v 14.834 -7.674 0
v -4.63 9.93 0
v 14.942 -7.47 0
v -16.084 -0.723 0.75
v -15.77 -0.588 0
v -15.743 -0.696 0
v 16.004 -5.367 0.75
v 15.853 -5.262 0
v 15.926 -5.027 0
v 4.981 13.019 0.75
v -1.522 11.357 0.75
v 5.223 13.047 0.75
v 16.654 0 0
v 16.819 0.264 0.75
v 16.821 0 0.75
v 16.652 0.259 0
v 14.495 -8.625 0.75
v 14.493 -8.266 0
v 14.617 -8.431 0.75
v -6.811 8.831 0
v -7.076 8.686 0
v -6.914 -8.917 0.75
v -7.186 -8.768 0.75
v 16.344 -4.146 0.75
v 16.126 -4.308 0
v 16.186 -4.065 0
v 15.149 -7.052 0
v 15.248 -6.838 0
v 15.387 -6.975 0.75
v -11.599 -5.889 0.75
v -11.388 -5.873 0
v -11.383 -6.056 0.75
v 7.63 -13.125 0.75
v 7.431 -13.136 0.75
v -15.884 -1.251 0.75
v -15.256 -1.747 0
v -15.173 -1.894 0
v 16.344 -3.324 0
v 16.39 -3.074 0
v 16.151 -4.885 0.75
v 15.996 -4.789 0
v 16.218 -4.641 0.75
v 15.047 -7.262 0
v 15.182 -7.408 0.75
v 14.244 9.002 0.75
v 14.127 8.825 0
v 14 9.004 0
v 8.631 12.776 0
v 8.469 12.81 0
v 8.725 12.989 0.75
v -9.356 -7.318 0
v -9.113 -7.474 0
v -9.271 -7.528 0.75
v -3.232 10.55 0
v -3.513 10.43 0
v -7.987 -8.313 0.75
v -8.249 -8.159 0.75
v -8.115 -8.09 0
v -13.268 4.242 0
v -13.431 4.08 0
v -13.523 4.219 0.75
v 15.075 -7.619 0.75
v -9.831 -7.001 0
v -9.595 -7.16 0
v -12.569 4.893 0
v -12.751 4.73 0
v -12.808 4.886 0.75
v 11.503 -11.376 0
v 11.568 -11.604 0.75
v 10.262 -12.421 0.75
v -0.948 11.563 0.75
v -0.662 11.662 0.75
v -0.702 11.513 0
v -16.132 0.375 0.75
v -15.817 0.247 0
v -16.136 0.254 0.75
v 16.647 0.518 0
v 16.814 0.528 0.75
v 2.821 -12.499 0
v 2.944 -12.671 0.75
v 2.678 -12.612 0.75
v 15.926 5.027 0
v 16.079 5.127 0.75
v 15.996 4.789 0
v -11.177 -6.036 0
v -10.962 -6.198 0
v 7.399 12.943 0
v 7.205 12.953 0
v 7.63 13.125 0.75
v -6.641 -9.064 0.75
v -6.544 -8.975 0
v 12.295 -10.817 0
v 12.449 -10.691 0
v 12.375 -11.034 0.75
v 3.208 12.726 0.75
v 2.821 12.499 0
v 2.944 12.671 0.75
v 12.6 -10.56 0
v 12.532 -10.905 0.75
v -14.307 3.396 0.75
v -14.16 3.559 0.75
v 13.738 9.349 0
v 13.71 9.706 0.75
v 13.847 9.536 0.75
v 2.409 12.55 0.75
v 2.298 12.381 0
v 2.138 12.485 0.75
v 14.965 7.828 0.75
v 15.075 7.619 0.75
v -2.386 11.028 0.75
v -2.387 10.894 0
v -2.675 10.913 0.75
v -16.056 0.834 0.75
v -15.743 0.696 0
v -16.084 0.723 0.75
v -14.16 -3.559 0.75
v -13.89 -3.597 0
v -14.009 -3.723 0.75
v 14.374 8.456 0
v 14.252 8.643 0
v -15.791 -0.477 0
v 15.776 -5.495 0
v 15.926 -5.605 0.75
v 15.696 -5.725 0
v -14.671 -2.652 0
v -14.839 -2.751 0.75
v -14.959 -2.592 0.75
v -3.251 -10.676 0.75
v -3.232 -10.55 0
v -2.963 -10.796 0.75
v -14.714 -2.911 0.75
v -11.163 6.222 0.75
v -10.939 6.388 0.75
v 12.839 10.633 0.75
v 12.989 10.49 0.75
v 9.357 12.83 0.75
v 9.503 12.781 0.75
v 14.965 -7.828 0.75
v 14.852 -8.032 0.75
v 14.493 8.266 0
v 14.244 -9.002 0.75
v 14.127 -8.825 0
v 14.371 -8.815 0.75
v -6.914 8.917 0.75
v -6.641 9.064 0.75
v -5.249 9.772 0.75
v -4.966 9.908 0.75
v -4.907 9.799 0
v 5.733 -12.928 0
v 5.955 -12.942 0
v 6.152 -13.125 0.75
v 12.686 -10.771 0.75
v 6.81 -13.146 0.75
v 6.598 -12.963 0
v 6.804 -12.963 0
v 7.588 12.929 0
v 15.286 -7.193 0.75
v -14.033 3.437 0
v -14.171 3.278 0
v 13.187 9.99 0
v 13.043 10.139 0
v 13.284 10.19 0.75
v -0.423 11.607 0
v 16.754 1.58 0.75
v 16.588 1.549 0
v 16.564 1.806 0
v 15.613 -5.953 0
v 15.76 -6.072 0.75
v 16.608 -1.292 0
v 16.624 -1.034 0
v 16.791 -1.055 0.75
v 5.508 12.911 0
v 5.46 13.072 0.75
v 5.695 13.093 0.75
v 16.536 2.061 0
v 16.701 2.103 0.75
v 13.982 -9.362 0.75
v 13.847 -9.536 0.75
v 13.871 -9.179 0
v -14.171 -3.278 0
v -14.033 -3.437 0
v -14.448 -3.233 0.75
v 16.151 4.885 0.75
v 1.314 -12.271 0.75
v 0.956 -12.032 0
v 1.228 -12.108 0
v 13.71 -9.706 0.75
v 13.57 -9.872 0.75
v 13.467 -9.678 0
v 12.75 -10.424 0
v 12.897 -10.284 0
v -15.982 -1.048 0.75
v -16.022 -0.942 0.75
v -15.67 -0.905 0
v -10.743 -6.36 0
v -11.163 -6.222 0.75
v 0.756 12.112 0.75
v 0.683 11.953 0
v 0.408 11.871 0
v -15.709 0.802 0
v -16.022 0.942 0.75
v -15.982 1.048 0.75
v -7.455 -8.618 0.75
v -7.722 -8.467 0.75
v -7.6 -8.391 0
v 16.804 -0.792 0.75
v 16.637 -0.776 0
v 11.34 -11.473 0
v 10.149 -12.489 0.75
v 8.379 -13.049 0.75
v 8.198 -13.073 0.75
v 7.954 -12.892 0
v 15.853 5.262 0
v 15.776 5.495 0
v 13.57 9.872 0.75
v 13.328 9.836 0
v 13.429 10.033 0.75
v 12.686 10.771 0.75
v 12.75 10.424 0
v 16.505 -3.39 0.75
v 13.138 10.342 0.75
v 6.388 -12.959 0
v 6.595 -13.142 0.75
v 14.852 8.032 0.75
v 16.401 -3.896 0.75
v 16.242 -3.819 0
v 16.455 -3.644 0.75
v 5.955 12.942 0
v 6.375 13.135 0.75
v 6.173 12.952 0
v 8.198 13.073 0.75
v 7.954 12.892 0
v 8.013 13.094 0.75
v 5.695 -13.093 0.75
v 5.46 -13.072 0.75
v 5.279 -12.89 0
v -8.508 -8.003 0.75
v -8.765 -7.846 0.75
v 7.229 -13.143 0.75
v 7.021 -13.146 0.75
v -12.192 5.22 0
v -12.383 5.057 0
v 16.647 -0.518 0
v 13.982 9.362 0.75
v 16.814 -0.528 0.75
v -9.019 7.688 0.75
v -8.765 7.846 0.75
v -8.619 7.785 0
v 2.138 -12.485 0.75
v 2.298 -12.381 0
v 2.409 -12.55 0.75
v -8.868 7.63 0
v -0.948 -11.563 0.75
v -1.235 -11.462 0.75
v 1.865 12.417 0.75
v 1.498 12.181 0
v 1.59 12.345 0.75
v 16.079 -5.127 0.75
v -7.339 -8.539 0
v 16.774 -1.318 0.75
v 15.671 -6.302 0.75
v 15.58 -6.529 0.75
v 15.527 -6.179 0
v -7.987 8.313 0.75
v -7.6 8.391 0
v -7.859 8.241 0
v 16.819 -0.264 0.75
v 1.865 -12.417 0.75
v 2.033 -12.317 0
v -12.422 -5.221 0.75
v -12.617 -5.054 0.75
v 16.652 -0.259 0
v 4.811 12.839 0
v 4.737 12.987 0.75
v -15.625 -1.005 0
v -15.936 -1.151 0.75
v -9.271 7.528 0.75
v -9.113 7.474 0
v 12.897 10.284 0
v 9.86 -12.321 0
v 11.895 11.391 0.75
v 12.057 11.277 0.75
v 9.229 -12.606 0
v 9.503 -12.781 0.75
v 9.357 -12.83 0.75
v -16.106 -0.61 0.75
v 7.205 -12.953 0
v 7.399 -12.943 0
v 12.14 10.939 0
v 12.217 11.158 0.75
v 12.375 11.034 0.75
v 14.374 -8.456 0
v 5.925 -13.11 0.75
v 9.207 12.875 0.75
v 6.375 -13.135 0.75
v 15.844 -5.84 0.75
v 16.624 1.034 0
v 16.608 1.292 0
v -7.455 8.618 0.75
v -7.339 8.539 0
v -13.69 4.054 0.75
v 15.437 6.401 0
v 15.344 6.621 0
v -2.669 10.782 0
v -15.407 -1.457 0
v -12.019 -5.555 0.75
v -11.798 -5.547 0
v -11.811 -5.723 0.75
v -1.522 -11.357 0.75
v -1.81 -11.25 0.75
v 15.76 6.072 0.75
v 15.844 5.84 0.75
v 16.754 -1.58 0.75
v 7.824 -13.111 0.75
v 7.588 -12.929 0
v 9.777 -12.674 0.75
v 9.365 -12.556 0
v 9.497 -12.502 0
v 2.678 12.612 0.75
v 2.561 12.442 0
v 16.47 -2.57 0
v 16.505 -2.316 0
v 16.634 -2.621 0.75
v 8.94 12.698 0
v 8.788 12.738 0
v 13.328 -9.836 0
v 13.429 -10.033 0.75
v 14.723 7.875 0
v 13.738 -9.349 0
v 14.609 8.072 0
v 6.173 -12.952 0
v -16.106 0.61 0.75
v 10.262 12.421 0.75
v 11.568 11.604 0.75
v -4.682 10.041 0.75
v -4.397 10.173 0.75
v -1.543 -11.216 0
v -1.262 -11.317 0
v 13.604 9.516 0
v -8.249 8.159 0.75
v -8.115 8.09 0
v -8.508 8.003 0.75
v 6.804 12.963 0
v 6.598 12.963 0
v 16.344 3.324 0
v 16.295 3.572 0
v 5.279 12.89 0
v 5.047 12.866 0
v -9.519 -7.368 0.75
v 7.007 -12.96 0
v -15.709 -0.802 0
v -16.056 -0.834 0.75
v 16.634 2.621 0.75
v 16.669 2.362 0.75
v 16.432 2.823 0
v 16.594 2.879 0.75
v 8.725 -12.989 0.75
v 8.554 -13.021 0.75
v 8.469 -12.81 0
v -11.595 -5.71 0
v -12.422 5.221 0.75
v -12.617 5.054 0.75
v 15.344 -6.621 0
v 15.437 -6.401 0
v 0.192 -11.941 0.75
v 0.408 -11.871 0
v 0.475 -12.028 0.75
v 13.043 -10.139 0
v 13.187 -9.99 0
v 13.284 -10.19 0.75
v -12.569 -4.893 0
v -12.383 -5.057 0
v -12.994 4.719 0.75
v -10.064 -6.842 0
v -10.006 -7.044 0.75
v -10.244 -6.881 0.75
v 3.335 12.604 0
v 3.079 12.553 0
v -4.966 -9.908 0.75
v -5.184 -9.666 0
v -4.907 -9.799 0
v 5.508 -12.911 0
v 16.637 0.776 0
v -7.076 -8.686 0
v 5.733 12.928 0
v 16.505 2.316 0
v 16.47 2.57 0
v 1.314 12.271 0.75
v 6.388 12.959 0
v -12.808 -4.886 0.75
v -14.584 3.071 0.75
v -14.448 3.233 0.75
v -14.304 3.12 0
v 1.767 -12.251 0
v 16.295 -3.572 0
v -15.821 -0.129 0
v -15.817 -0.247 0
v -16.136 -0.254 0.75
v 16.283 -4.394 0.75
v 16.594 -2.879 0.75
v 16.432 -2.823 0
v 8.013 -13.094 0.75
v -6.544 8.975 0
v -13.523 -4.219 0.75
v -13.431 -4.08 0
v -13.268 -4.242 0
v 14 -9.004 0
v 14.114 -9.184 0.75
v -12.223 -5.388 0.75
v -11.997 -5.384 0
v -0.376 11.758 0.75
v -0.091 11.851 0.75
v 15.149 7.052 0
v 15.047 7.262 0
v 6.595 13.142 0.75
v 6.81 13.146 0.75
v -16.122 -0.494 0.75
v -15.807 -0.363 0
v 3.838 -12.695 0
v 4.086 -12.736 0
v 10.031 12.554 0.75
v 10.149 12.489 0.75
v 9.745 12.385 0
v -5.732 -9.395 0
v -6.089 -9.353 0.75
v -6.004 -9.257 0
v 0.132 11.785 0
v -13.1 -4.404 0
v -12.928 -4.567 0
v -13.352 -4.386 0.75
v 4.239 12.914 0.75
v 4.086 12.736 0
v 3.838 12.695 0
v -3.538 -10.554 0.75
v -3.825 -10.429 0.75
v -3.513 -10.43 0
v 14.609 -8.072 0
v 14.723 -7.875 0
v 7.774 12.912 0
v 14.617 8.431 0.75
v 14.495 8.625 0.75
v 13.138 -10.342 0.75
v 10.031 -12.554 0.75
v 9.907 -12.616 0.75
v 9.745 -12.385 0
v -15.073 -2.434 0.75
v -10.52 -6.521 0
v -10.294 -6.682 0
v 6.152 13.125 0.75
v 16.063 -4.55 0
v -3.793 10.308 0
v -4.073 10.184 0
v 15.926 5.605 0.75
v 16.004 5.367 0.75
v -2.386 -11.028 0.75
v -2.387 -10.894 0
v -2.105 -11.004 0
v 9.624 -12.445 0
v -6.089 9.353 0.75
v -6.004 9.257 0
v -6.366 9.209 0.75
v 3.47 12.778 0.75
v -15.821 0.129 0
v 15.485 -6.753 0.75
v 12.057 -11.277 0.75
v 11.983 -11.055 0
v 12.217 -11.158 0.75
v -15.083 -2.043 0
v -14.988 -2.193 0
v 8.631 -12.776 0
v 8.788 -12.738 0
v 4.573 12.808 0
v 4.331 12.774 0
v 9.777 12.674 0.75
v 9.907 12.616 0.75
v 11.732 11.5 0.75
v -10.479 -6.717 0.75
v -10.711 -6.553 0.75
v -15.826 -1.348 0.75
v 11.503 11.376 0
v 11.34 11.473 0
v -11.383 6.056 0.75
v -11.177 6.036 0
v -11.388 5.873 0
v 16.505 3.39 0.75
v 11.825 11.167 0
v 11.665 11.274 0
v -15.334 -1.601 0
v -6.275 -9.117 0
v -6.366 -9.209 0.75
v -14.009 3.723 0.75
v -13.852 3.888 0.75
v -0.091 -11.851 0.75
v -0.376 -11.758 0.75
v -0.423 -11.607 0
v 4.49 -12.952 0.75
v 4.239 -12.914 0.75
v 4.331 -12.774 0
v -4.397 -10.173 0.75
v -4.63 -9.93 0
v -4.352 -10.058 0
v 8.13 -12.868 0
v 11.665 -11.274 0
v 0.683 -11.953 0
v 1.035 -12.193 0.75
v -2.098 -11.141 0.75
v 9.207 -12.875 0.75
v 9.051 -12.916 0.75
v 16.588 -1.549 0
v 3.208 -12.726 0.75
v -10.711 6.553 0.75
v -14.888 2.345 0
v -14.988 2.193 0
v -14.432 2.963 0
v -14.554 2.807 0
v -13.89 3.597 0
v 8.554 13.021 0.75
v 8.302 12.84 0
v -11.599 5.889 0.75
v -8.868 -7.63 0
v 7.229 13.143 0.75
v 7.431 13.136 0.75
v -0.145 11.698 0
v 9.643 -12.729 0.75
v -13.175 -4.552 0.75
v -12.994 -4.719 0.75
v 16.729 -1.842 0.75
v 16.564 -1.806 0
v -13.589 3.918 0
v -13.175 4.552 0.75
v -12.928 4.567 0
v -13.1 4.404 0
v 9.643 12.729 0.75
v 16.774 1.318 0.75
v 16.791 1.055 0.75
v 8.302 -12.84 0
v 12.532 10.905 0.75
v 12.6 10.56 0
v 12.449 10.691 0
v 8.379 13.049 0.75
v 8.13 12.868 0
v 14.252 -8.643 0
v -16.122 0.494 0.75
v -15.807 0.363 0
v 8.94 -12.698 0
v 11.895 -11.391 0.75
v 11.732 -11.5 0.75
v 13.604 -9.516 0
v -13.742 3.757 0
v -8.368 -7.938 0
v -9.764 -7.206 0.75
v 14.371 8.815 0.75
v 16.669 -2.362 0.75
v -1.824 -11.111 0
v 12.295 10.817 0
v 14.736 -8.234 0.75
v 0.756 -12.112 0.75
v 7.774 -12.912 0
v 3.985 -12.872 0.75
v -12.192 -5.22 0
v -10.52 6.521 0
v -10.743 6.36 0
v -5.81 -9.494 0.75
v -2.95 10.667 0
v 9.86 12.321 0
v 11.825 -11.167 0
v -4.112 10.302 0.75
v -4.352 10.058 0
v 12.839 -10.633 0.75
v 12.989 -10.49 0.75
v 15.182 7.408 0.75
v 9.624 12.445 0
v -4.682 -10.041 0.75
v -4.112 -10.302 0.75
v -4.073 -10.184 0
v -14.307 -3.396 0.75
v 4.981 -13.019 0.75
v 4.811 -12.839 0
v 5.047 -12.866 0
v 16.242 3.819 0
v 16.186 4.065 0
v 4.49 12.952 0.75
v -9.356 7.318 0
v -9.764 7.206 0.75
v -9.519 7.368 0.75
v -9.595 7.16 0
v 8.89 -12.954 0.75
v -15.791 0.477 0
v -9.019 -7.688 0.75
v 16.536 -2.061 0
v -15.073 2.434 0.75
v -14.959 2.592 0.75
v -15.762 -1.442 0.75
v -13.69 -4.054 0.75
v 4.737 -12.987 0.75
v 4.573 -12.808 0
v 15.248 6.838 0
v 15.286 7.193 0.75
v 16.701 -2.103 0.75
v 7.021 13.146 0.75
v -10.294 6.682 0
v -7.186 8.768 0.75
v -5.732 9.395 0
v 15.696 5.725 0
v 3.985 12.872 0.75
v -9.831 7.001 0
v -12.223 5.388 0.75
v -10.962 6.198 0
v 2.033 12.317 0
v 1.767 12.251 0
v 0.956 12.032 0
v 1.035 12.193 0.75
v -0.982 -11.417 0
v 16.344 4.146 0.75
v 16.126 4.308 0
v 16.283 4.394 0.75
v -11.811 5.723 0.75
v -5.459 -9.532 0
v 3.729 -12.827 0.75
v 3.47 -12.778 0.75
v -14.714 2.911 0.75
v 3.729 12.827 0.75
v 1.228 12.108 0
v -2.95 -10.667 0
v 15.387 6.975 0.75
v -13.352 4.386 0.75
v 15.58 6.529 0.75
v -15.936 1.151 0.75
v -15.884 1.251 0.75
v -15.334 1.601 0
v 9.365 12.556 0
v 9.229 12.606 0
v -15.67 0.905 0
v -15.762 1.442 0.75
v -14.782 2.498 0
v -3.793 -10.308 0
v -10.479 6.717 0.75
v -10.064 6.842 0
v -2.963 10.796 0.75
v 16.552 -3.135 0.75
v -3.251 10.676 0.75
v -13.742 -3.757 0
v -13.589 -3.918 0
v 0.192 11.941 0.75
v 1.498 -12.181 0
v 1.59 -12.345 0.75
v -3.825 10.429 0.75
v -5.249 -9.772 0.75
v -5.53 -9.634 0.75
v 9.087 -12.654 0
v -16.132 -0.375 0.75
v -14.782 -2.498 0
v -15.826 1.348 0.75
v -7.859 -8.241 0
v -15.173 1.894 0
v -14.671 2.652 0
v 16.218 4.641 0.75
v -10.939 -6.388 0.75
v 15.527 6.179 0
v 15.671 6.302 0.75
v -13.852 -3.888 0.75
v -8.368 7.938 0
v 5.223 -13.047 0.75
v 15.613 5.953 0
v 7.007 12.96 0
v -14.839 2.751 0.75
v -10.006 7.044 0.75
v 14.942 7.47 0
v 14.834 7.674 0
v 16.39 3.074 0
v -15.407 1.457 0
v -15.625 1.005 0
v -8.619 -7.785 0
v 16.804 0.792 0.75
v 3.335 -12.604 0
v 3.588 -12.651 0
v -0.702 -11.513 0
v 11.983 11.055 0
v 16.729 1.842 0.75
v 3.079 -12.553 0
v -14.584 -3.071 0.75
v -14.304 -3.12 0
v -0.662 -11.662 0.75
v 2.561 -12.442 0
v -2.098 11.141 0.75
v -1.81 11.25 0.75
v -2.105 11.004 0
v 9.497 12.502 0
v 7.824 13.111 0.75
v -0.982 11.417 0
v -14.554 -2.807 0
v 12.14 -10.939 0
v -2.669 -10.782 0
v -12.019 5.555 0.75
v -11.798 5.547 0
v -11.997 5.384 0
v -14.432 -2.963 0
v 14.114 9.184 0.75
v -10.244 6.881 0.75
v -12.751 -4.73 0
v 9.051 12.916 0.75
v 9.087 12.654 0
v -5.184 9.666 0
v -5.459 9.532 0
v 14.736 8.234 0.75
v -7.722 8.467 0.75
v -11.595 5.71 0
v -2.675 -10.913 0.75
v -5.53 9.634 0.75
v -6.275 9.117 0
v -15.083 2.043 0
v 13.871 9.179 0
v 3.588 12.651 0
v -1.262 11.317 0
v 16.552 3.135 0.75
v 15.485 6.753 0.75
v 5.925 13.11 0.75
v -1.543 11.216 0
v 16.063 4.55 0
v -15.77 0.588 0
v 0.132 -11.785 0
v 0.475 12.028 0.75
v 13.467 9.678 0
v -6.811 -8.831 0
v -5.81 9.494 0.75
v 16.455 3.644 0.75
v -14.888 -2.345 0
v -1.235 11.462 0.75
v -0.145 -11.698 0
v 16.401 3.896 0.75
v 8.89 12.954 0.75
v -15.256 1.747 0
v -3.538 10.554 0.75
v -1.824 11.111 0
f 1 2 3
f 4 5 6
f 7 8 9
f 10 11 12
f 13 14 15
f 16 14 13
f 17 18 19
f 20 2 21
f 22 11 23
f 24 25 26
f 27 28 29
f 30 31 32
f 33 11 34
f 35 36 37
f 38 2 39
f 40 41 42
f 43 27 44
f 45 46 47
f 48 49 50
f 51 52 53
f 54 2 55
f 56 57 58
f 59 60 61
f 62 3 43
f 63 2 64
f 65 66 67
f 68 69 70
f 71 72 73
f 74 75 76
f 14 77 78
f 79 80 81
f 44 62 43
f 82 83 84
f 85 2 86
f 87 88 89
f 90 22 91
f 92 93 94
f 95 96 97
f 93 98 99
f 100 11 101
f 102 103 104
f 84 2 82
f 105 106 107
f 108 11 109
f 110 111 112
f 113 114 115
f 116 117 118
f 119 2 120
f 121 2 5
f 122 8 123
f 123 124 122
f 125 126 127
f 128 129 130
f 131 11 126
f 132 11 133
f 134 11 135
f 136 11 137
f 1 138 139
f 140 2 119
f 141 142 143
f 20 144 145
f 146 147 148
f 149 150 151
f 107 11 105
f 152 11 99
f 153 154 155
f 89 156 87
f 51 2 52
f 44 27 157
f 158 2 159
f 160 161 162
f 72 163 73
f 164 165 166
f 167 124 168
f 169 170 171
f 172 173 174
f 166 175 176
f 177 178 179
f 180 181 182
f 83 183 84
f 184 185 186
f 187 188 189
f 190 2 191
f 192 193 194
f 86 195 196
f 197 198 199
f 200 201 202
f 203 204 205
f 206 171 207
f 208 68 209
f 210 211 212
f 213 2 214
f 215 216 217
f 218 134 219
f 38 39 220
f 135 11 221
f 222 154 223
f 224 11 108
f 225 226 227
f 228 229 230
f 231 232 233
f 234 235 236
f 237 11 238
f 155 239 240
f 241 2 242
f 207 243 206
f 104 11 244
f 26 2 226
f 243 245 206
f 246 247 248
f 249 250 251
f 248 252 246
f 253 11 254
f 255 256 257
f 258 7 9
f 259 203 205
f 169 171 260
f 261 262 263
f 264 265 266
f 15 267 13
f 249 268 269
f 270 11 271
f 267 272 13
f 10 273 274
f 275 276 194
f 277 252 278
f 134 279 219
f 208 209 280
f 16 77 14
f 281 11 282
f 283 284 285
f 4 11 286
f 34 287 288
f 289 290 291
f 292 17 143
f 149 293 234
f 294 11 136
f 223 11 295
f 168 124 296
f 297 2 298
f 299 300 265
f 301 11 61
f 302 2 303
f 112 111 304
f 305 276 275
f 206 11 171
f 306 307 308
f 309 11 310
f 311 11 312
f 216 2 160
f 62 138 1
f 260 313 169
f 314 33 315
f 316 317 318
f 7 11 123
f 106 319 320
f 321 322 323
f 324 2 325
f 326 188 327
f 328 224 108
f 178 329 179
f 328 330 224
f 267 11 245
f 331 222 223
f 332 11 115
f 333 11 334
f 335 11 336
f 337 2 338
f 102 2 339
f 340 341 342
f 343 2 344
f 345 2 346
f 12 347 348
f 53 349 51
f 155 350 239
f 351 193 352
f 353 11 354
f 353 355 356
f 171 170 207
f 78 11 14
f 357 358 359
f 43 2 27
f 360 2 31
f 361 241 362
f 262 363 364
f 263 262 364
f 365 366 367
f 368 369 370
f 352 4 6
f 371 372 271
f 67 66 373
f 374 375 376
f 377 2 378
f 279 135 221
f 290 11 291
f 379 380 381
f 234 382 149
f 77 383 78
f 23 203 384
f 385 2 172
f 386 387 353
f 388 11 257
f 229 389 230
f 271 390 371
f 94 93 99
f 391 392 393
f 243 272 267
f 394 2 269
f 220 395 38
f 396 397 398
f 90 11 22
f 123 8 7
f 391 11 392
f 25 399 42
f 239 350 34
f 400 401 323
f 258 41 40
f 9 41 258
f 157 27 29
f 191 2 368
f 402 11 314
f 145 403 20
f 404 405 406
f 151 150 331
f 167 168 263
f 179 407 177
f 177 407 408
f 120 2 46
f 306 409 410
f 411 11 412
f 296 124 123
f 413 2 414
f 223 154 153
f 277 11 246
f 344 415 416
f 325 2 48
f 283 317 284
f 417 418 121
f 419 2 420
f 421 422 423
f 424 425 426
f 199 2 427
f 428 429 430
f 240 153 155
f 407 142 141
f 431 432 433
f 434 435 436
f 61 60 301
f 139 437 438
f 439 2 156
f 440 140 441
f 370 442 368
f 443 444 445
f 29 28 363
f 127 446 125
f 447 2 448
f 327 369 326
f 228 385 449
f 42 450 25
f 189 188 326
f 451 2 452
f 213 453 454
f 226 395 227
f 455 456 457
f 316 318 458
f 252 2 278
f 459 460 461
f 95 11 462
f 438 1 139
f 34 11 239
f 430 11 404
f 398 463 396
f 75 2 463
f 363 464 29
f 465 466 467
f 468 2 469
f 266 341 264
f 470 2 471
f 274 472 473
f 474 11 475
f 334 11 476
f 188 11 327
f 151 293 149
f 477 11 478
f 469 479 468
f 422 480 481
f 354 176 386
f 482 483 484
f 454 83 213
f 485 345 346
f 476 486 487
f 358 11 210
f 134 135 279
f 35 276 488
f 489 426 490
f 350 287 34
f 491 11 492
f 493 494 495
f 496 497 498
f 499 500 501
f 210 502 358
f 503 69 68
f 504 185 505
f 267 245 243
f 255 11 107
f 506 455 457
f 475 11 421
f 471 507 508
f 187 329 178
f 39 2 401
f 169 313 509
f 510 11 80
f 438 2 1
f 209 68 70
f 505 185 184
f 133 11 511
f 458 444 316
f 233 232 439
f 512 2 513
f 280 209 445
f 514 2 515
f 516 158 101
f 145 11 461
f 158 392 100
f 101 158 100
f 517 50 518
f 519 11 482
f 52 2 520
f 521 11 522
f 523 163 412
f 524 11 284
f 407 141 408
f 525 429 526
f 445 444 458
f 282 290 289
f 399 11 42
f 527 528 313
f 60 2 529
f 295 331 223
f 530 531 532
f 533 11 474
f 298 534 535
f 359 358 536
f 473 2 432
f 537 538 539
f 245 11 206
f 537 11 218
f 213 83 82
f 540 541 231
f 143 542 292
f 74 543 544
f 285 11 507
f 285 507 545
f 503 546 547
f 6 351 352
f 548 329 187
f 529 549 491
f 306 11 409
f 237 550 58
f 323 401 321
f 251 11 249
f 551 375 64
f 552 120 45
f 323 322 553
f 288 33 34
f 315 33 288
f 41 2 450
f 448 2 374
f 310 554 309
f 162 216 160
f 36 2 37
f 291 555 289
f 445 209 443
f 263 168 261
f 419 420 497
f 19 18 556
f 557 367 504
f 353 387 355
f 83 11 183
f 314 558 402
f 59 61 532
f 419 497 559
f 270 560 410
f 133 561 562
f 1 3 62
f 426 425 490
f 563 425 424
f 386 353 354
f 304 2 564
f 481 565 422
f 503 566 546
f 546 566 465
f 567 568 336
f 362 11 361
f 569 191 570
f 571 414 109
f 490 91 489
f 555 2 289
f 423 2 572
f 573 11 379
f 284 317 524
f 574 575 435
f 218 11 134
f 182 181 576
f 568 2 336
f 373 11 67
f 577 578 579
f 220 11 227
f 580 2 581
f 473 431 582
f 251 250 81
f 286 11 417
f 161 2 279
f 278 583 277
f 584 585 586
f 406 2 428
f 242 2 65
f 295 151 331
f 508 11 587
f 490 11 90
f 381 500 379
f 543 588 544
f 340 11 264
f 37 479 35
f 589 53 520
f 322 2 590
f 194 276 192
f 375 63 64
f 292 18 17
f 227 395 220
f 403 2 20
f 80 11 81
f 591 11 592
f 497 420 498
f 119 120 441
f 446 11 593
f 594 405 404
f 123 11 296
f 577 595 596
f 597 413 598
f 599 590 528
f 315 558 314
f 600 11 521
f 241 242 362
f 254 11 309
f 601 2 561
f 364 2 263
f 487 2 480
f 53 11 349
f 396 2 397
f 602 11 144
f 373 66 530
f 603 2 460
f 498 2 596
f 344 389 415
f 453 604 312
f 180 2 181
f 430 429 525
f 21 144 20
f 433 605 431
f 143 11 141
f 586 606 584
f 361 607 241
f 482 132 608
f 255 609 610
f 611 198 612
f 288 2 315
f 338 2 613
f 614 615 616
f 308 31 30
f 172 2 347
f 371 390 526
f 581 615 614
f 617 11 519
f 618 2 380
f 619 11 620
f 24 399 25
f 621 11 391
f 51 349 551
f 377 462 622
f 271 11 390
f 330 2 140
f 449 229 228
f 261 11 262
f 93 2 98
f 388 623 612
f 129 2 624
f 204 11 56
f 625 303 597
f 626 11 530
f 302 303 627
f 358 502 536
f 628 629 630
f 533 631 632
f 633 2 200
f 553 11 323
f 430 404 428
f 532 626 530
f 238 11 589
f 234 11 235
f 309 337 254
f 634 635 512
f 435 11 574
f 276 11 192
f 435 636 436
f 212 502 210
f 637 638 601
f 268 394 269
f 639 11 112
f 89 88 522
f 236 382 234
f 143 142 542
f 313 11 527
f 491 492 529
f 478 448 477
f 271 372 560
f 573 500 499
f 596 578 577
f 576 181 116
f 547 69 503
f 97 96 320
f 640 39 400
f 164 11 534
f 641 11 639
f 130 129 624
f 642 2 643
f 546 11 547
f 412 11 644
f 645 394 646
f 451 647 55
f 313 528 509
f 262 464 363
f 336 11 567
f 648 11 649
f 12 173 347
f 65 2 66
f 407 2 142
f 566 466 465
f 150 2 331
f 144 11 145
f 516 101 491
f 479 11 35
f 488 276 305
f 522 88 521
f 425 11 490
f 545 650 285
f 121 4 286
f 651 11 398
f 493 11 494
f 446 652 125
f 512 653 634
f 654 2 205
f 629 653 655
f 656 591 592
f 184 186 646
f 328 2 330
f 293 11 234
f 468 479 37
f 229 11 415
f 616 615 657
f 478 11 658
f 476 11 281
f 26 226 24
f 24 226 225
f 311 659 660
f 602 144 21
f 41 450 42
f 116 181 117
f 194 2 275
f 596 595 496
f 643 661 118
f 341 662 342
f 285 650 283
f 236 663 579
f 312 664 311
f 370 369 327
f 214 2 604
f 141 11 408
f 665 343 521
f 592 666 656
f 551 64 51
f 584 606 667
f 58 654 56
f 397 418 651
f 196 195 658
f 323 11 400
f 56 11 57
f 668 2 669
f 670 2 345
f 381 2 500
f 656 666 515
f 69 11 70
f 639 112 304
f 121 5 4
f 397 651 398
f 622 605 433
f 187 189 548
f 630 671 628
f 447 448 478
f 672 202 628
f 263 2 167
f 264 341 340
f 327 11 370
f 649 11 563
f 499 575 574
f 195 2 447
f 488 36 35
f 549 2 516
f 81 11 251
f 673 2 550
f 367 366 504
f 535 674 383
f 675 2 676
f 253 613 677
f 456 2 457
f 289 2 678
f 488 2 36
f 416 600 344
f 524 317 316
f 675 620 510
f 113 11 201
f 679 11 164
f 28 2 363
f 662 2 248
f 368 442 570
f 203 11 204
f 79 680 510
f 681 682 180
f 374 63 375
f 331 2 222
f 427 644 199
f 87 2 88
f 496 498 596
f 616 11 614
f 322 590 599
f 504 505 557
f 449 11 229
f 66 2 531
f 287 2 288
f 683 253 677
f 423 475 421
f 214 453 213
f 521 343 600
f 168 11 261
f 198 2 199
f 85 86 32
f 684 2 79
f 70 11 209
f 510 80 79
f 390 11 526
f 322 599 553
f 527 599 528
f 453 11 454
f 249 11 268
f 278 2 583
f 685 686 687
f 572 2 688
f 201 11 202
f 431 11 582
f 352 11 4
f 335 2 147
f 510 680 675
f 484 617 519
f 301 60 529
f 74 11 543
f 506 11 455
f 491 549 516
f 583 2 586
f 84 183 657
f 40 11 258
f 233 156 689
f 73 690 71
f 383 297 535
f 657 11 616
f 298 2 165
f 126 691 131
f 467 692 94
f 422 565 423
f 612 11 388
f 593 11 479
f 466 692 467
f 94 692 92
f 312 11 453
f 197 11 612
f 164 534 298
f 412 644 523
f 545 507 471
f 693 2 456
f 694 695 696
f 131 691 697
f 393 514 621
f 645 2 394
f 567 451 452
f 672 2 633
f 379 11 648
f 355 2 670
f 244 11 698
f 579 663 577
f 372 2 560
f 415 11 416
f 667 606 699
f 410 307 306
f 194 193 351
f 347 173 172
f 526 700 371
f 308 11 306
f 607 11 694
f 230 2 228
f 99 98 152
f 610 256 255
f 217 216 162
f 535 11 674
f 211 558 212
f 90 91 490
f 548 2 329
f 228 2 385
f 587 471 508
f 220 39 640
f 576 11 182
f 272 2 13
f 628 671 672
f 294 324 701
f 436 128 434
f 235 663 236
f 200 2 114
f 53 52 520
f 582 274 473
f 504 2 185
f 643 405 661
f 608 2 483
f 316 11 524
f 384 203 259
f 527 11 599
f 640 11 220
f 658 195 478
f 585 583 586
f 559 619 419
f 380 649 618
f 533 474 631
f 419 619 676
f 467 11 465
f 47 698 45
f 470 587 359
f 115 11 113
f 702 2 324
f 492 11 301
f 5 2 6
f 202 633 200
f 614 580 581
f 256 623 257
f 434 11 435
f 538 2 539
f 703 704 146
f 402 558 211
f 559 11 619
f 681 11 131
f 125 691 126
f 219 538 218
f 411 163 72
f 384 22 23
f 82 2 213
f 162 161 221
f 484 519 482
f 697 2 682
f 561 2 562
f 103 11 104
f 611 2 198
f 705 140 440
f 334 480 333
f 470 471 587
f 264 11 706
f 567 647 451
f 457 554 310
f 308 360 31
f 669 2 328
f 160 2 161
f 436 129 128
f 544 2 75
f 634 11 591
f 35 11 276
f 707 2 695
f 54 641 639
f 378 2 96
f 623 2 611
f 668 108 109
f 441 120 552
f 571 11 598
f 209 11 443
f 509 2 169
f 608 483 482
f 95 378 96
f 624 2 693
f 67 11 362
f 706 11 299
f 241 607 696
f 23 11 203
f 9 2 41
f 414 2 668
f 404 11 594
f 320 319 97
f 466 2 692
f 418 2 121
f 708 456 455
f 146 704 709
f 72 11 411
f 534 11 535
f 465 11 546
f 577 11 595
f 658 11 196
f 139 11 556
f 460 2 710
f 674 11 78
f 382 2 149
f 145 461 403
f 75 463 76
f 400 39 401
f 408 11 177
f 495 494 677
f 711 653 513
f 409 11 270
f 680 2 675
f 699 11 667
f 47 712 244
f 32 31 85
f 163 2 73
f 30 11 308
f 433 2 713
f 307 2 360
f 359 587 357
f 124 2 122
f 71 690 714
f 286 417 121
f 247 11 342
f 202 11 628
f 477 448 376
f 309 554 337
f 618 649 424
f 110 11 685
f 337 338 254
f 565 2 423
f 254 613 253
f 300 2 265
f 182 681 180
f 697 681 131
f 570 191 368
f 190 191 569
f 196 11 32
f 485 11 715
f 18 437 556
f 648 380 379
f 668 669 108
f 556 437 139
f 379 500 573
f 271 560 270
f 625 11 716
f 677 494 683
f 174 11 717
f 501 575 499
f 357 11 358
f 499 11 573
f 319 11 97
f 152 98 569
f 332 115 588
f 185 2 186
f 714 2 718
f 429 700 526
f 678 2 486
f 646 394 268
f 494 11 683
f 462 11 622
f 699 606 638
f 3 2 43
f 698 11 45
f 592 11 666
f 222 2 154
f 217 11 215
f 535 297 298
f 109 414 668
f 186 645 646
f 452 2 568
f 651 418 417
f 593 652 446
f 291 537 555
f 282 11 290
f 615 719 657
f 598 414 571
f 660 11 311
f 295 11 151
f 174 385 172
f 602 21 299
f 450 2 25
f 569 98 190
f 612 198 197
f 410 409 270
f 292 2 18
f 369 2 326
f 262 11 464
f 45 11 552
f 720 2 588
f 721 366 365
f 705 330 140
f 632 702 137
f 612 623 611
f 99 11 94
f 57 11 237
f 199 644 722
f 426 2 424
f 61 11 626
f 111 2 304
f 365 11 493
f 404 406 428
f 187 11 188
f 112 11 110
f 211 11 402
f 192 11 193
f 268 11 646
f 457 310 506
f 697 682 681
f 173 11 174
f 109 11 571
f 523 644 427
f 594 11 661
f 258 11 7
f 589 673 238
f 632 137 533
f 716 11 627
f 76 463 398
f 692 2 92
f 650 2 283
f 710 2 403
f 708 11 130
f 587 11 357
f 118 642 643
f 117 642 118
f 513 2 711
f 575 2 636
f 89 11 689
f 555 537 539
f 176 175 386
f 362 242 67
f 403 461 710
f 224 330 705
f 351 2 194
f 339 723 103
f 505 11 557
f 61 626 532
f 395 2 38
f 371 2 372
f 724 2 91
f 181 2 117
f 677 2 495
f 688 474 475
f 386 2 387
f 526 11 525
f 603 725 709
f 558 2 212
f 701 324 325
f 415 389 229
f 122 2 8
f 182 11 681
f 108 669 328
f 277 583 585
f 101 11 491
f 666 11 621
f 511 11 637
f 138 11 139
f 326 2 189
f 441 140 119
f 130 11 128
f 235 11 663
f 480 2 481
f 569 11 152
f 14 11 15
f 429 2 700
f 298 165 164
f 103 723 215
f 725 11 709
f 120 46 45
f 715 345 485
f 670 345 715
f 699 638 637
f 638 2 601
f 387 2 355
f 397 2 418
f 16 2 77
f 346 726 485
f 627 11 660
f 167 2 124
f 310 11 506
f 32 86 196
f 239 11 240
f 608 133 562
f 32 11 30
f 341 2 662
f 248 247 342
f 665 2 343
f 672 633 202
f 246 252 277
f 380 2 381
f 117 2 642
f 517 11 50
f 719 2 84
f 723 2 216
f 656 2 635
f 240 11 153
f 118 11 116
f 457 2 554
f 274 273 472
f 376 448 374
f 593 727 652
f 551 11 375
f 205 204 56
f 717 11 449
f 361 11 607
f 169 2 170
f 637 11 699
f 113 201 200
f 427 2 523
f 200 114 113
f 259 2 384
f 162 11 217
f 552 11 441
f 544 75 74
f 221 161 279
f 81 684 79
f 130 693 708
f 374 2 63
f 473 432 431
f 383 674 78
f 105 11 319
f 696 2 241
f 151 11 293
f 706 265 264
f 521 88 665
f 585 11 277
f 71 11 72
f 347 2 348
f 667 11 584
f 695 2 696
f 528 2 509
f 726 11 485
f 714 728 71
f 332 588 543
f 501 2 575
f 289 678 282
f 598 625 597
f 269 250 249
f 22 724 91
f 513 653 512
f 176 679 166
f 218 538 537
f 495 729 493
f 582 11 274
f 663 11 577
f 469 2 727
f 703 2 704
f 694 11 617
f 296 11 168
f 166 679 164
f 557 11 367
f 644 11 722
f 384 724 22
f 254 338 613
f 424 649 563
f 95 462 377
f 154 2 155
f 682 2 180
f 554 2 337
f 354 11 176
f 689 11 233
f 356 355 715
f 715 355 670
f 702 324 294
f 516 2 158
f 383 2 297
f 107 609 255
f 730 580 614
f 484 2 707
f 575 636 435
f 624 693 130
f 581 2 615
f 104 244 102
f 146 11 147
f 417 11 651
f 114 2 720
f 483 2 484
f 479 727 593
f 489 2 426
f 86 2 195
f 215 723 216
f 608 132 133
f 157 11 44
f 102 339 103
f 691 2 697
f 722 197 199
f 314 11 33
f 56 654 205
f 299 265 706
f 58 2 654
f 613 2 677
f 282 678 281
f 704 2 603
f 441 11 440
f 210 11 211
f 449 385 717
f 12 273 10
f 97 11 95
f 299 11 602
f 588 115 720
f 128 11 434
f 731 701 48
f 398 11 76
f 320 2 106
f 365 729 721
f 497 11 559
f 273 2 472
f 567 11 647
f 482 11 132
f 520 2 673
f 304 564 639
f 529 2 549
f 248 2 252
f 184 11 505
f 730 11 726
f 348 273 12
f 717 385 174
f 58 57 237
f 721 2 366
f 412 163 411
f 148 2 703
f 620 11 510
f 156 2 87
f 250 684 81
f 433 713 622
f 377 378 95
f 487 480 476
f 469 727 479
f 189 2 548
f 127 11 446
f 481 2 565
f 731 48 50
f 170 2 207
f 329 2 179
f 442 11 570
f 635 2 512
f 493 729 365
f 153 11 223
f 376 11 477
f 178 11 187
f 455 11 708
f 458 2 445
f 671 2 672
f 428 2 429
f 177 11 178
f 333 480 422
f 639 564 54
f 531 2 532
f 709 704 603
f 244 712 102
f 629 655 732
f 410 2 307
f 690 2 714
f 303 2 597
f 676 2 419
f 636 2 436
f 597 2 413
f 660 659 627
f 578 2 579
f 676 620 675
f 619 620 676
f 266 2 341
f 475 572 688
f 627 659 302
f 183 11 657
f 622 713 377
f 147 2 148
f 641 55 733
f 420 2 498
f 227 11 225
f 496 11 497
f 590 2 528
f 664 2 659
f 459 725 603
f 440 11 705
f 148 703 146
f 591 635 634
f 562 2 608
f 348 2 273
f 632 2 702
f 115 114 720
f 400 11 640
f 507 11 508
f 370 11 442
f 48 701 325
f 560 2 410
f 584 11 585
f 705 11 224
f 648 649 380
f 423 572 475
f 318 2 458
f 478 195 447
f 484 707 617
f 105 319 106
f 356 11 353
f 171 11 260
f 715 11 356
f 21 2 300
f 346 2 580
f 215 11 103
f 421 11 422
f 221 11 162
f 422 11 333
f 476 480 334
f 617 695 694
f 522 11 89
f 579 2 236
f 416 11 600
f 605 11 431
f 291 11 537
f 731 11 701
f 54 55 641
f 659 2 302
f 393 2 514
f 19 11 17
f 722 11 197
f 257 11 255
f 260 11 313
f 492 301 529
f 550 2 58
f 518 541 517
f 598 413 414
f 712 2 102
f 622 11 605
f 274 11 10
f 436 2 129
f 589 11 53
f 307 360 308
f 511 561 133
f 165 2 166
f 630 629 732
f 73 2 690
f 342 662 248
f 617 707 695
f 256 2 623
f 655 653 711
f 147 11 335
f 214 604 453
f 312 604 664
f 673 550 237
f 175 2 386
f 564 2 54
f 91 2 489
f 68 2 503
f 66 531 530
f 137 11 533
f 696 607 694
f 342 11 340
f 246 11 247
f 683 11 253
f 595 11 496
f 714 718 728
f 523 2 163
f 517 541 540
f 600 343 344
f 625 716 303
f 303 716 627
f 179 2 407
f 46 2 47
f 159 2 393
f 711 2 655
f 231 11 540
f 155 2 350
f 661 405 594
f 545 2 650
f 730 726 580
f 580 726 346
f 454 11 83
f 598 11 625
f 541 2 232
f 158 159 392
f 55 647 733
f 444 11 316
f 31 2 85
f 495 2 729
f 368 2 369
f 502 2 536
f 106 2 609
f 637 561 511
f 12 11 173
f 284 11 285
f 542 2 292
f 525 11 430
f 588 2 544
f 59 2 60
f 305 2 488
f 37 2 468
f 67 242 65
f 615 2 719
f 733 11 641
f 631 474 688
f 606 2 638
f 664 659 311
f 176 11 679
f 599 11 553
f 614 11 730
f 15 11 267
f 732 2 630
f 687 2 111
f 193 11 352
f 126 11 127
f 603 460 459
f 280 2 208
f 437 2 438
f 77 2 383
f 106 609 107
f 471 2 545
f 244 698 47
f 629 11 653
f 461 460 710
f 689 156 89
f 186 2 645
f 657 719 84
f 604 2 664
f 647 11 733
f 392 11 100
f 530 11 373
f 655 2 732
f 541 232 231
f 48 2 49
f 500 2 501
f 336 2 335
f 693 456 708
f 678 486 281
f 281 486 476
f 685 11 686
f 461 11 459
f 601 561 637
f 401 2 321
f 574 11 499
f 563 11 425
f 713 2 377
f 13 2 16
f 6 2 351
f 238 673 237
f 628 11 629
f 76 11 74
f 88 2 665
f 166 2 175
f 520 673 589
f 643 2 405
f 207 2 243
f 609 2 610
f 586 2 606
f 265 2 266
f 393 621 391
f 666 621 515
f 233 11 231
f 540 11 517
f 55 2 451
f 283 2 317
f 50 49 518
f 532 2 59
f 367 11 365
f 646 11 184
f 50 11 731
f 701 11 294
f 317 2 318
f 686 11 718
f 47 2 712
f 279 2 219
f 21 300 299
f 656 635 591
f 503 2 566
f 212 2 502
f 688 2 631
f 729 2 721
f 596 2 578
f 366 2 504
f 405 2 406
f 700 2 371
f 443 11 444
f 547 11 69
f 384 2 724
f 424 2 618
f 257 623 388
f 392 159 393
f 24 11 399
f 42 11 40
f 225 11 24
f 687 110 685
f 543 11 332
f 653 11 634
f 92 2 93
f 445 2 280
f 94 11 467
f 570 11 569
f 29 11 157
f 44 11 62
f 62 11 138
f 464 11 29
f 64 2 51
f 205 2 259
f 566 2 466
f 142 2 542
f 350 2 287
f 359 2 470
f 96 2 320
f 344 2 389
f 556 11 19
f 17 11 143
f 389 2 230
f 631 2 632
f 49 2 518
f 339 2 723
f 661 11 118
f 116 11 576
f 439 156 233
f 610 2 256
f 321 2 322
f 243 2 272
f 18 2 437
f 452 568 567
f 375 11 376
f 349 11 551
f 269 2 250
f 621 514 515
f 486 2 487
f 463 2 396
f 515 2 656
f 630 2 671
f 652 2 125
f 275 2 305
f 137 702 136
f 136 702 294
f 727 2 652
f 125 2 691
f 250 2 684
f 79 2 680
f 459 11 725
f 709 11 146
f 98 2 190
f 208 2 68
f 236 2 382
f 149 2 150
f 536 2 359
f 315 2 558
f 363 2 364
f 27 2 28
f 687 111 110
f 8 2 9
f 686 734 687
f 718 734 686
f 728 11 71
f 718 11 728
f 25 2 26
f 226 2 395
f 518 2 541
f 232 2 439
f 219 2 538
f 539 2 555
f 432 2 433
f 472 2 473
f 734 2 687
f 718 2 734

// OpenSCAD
// file: tearConstants.scad
//=================================================================================
// tearConstants.scad
//
// Tear Drop style guitar pick constants, included in all files.
//
// Dr Tom Flint, 20 Feb 2025
//=================================================================================


// choose which pick thickness to make
Num = 7;    // [0,1,2,3,4,5,6,7]

//     0    1    2    3    4    5    6    7
Tn = [0.4, 0.5, 0.6, 0.7, 0.8, 1.0, 1.2, 1.5];
Ln = ["4", "5", "6", "7", "8", "A", "C", "F"];

T = Tn[Num];    // thickness
Label=Ln[Num];  // label

R = 8;      // radius of scaled circles
X = 5.2;    // long dimension of pick
Z = 0.2;    // depth of grip pattern

F = 299;     // set $fn

//=================================================================================
// main file
//=================================================================================
// tearHalf.scad
//
// Dr Tom Flint, 20 Feb 2025
//=================================================================================

include <./tearConstants.scad>

//-----------------------------------------------------------------------------------
// pattern for the upper grip
module tearUpper(){
  
  render()
  intersection(){
    translate([0,0,-0.3])
    scale([1,1,0.02])
    surface(file="./tearUpper.png", center = true);
    translate([0,0,0.5])
    cube([800,800,1],center=true);
  }
}  

//-----------------------------------------------------------------------------------
// pattern for the lower grip
module tearLower(){
  
  render()
  intersection(){
    translate([0,0,-0.3])
    scale([1,1,0.02])
    surface(file="./tearLower.png", center = true);
    translate([0,0,0.5])
    cube([800,800,1],center=true);
  }
}  

//-----------------------------------------------------------------------------------
// half of the pick, side 0 is upper, side 1 is lower
module tearhalf(side=0){
  
  scale([1.1,1.1,1]){

    hull(){
      translate([1.45*X,0,0])
      scale([0.95,1.4,1])
      cylinder(r1=R,r2=1.02*R,h=T/2,$fn=F);
      
      rotate([0,0,115])
      translate([X,0,0])
      scale([0.7,1.95,1])
      cylinder(r1=0.85*R,r2=0.87*R,h=T/2,$fn=F);
      
      rotate([0,0,-115])
      translate([X,0,0])
      scale([0.7,1.95,1])
      cylinder(r1=0.85*R,r2=0.87*R,h=T/2,$fn=F);
    }
    
    if(side==0){
      translate([1,0.5,0])
      rotate([180,0,0])
      scale([0.037,0.037,Z])
      tearUpper();
    }else{
      translate([1,0.5,0])
      rotate([180,0,0])
      scale([0.037,0.037,Z])
      tearLower();
      
      translate([2.5,0,0])
      rotate([0,0,90])
      rotate([180,0,0])
      linear_extrude(height=Z)
      text(Label, font = "Open Sans:style=Bold", size=6,halign="center",valign="center",spacing=1.1);
      
    }
  }
}

//===================================================================================

tearhalf();

//===================================================================================
